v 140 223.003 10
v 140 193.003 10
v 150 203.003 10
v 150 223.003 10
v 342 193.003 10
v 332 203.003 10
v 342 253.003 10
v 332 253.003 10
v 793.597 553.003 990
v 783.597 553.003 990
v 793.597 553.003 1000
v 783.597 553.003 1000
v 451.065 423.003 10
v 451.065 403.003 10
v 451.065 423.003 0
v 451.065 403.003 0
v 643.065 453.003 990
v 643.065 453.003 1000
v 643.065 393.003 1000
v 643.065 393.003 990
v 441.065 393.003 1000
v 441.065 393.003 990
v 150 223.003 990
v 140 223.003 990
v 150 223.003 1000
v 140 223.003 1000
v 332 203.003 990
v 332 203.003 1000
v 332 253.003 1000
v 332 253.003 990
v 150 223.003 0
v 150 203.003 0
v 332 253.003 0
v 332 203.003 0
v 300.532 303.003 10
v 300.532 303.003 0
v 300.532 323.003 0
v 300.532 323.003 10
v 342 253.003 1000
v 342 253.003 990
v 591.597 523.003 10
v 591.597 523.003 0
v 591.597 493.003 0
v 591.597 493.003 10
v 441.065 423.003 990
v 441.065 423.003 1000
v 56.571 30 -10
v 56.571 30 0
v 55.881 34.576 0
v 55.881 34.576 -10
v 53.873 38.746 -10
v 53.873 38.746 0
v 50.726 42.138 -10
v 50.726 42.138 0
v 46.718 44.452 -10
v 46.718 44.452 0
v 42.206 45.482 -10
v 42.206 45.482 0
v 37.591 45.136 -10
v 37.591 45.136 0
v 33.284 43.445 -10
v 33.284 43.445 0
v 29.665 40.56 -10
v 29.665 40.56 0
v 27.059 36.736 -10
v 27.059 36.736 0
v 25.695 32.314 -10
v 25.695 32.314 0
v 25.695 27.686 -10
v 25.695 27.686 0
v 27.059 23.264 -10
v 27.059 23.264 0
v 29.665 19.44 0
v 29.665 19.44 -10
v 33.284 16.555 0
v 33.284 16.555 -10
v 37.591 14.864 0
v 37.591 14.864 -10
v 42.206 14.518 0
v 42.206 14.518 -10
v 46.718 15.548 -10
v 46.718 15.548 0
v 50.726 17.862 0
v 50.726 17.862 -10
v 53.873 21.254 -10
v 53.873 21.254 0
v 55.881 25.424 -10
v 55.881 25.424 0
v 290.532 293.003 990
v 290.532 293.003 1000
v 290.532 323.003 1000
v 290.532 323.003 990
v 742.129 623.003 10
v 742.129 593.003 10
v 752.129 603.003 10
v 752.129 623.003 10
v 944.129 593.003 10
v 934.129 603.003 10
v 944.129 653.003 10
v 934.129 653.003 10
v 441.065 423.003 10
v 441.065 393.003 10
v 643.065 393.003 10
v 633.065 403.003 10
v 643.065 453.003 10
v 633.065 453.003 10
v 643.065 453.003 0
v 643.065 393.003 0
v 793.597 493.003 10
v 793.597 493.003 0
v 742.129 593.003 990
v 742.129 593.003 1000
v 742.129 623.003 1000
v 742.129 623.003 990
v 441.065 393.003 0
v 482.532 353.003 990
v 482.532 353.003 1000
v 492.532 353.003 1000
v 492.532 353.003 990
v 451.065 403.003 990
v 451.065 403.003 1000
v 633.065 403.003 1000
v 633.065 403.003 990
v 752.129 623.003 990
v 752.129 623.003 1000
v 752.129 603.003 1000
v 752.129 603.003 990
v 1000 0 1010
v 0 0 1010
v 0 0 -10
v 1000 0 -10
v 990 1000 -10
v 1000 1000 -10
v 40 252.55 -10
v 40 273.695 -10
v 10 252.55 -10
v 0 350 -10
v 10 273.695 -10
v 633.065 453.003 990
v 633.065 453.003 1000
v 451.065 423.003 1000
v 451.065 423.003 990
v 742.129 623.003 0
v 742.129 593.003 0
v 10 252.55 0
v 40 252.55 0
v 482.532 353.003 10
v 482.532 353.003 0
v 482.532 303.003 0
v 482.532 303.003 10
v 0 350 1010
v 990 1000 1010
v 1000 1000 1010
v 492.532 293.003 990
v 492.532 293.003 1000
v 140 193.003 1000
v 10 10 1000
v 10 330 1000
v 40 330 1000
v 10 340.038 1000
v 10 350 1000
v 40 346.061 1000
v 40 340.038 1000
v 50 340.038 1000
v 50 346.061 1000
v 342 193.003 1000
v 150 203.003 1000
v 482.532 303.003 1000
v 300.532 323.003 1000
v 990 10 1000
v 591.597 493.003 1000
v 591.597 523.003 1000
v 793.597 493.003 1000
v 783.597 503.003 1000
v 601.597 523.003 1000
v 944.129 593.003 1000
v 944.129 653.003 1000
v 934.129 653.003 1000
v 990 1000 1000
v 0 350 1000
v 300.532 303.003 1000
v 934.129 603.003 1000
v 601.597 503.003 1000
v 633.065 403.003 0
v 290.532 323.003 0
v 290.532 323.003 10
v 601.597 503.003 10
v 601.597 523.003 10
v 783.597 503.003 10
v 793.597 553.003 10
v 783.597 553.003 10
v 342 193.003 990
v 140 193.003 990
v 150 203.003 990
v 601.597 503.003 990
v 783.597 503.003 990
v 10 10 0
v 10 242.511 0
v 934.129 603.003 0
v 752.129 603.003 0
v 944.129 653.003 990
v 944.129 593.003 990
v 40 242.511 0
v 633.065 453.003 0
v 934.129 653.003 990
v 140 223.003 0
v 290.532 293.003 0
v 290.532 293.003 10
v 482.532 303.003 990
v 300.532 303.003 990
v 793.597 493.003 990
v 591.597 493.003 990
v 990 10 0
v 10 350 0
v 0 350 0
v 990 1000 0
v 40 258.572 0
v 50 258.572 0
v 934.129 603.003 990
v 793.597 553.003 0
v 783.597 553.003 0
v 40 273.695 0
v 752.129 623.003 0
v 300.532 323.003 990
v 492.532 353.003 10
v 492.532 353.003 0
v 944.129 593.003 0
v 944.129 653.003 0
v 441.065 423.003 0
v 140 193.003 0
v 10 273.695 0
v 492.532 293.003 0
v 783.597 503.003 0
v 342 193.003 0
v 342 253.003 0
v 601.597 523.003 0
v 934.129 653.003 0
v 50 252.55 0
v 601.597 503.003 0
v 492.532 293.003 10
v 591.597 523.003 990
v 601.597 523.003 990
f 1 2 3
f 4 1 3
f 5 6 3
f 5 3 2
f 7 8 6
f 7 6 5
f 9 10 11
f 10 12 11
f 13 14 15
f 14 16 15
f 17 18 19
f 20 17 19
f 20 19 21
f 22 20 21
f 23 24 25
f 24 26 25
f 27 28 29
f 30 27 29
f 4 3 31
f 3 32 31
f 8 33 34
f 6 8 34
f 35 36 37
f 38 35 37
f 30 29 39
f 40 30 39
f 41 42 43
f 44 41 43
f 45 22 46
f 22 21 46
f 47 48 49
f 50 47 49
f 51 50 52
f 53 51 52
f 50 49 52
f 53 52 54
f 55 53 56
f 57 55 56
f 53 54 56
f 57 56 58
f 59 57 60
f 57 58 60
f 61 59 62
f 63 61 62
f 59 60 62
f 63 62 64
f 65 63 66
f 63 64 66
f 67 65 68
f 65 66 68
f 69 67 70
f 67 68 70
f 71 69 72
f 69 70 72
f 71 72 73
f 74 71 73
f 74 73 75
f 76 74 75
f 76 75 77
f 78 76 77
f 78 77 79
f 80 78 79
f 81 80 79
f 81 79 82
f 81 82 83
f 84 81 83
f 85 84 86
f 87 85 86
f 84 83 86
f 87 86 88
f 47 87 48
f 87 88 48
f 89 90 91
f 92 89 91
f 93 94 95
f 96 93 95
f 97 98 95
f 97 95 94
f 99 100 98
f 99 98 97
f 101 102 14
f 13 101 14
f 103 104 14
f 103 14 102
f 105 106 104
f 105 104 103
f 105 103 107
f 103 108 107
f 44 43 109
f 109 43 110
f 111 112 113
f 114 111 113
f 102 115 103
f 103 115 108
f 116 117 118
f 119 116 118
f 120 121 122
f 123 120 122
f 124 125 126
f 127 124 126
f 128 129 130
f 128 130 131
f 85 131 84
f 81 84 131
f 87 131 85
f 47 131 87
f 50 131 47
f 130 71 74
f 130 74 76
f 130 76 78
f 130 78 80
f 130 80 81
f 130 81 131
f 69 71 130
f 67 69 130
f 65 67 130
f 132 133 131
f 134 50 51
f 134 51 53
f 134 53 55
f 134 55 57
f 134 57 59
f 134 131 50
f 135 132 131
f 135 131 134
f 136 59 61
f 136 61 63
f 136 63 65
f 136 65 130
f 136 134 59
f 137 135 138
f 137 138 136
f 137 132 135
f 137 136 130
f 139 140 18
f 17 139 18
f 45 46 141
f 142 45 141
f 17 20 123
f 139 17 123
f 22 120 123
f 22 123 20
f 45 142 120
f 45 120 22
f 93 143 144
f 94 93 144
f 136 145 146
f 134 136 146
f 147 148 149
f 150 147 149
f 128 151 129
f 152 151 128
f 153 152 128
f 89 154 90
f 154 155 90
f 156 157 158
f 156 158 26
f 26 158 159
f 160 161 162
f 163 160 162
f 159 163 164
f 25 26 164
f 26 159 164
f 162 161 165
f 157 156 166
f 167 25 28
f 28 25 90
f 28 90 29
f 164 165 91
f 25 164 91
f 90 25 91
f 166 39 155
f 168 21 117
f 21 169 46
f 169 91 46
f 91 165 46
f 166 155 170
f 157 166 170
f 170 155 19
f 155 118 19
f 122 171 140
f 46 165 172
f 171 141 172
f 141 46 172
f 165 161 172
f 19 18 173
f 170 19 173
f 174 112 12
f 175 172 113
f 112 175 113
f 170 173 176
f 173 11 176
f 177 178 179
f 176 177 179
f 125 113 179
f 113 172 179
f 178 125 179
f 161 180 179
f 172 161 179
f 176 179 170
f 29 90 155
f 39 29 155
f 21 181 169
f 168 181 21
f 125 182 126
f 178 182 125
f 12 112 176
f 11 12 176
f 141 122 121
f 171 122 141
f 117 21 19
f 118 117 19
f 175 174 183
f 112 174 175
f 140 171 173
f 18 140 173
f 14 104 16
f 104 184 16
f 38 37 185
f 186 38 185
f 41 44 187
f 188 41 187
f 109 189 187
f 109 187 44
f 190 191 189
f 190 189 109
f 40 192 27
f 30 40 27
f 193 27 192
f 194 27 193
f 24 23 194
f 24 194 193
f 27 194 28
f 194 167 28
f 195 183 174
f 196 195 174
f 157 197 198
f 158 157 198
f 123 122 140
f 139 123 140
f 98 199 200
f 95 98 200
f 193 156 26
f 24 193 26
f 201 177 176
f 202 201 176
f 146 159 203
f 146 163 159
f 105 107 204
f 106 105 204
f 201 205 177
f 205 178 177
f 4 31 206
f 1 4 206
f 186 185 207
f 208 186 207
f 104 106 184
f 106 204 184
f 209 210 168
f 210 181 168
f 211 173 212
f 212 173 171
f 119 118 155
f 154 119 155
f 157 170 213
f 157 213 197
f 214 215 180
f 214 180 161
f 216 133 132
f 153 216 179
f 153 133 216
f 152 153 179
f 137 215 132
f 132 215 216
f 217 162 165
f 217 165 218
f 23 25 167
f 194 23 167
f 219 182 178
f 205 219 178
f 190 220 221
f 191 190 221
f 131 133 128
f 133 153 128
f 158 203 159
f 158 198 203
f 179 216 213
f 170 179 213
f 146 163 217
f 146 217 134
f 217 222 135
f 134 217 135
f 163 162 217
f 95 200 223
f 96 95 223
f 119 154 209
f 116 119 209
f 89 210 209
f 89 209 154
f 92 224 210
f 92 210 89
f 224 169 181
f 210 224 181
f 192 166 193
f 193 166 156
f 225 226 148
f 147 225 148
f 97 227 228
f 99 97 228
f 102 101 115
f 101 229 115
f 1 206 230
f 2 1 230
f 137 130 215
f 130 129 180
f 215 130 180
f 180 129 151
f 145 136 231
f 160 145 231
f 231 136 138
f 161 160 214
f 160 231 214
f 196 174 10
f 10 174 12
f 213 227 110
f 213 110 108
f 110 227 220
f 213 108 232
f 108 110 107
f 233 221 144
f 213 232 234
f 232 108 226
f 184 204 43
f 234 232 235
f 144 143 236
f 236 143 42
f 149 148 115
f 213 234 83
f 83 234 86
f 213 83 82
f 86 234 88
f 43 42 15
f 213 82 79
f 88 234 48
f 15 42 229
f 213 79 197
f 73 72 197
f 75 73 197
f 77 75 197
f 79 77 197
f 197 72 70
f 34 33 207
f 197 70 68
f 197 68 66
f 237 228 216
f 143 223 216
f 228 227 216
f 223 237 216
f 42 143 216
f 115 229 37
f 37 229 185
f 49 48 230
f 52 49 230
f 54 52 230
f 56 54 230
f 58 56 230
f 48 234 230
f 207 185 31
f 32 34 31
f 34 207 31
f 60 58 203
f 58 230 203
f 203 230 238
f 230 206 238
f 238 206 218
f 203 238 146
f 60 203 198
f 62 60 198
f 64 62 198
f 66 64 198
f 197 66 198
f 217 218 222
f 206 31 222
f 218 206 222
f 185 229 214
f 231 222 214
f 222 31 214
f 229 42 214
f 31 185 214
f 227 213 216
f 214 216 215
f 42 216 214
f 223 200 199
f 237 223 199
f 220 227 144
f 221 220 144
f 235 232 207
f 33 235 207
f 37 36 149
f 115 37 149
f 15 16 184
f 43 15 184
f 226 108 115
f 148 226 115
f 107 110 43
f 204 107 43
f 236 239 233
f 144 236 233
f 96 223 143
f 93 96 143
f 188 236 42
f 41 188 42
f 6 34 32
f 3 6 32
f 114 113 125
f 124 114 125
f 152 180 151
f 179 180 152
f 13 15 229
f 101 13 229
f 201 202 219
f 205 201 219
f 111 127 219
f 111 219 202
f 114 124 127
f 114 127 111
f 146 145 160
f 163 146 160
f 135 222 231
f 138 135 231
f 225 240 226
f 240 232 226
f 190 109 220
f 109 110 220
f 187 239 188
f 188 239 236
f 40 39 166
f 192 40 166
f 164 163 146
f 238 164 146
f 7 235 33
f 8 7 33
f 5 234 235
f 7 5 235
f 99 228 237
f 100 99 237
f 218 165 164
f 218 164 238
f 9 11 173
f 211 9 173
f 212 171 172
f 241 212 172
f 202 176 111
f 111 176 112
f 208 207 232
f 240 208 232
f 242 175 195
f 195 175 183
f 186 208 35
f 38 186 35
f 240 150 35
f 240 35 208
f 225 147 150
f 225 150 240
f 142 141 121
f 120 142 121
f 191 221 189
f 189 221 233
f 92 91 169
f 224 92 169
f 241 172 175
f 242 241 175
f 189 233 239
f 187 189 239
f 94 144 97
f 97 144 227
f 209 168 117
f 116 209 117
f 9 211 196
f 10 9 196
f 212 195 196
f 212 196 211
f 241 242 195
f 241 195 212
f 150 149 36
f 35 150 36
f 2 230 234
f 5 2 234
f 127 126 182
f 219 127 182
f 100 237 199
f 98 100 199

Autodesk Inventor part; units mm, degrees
ref_plane "YZ Plane" through (0, 0, 0) normal (1, 0, 0) x (0, 1, 0)
ref_plane "XZ Plane" through (0, 0, 0) normal (0, 1, 0) x (-1, 0, 0)
sketch "Esboço1" plane through (0, 0, 0) normal (0, 0, 1) x (1, 0, 0)
  line L0 (0, 0) -> (1000, 0)
  line L1 (1000, 0) -> (1000, 1000)
  line L2 (0, 0) -> (0, 350)
  line L3 (990, 1000) -> (990, 10)
  line L4 (990, 10) -> (10, 10)
  line L5 (10, 10) -> (10, 350)
  line L6 (0, 350) -> (10, 350)
  line L7 (990, 1000) -> (1000, 1000)
  line L8 (0, 350) -> (10, 350)
  line L9 (990, 1000) -> (1000, 1000)
  dimension "d6" = 1000
  dimension "d7" = 1000
  dimension "d8" = 350
  dimension "d10" = 10
extrude "Extrusão1" add sketch "Esboço1" along normal blind 1000
sketch "Esboço2" plane through (0, 0, 1000) normal (0, 0, 1) x (1, 0, 0)
  line L0 (10, 10) -> (10, 350) projected
  line L1 (0, 350) -> (0, 0) projected
  line L2 (1000, 1000) -> (990, 1000) projected
  line L3 (0, 350) -> (990, 1000)
  line L4 (0, 0) -> (1000, 0) projected
  line L5 (1000, 0) -> (1000, 1000) projected
  line L6 (0, 350) -> (0, 0)
  line L7 (1000, 0) -> (1000, 1000)
  line L8 (990, 1000) -> (1000, 1000)
extrude "Extrusão2" add sketch "Esboço2" along normal blind 10
sketch "Esboço3" plane through (0, 0, 0) normal (0, 0, -1) x (-1, 0, 0)
  line L0 (-10, 350) -> (0, 350) projected
  line L1 (-1000, 1000) -> (-990, 1000) projected
  line L2 (0, 350) -> (-990, 1000)
  line L3 (-990, 1000) -> (-1000, 1000)
  line L4 (-1000, 1000) -> (-1000, 0)
  line L5 (0, 0) -> (-1000, 0) projected
  line L6 (-1000, 0) -> (0, 0)
  line L7 (0, 0) -> (0, 350)
extrude "Extrusão3" add sketch "Esboço3" along normal blind 10
sketch "Esboço4" plane through (10, 10, 1000) normal (1, 0, 0) x (0, 0, -1)
  line L0 (1000, 990) -> (1000, 0) projected
  line L1 (1000, 232.5113) -> (0, 320)
  line L2 (0, 0) -> (0, 340) projected
  line L3 (0, 340) -> (-10, 340) projected
  line L4 (1000, 242.5495) -> (0, 330.0382)
  line L5 (1000, 232.5113) -> (1000, 242.5495)
  line L6 (1000, 0) -> (1000, 340) projected
  line L7 (0, 330.0382) -> (0, 320)
  point P0 (1000, -10)
  dimension "d11" = 85
  dimension "d13" = 20
  dimension "d14" = 10
extrude "Extrusão4" add sketch "Esboço4" along normal blind 30
sketch "Esboço5" plane through (40, 10, 1000) normal (1, 0, 0) x (0, 0, -1)
  line L0 (1000, 232.5113) -> (0, 320) projected
  line L1 (1000, 232.5113) -> (0, 320)
  line L2 (0, 336.0611) -> (1000, 248.5725)
  line L3 (1000, 242.5495) -> (1000, 340) projected
  line L4 (1000, 248.5725) -> (1000, 242.5495)
  line L5 (0, 336.0611) -> (0, 320)
  line L6 (0, 330.0382) -> (0, 340) projected
  line L7 (1000, 0) -> (1000, 232.5113) projected
  line L8 (1000, 232.5113) -> (0, 320)
  line L9 (0, 330.0382) -> (1000, 242.5495) projected
  point P0 (1000, -10)
  dimension "d18" = 6
extrude "Extrusão5" add sketch "Esboço5" along normal blind 10
sketch "Esboço6" plane through (0, 0, 0) normal (0, 0, 1) x (1, 0, 0)
  line L0 (10, 252.5495) -> (10, 350) projected
  line L1 (10, 252.5495) -> (40, 252.5495)
  line L2 (40, 252.5495) -> (40, 273.6954)
  line L3 (40, 273.6954) -> (10, 273.6954)
  line L4 (10, 273.6954) -> (10, 252.5495)
  point P0 (0, 0)
extrude "Extrusão6" cut sketch "Esboço6" against normal blind 10
sketch "Esboço7" plane through (0, 0, 0) normal (0, 0, 1) x (1, 0, 0)
  line L0 (0, 350) -> (990, 1000) projected
  line L1 (591.5971, 523.0033) -> (591.5971, 493.0033)
  line L2 (591.5971, 493.0033) -> (793.5971, 493.0033)
  line L3 (793.5971, 493.0033) -> (793.5971, 553.0033)
  line L4 (793.5971, 553.0033) -> (783.5971, 553.0033)
  line L5 (783.5971, 553.0033) -> (783.5971, 503.0033)
  line L6 (783.5971, 503.0033) -> (601.5971, 503.0033)
  line L7 (601.5971, 503.0033) -> (601.5971, 523.0033)
  line L8 (601.5971, 523.0033) -> (591.5971, 523.0033)
  line L9 (0, 0) -> (0, 350) projected
  line L10 (441.0647, 423.0033) -> (441.0647, 393.0033)
  line L11 (441.0647, 393.0033) -> (643.0647, 393.0033)
  line L12 (643.0647, 393.0033) -> (643.0647, 453.0033)
  line L13 (643.0647, 453.0033) -> (633.0647, 453.0033)
  line L14 (633.0647, 453.0033) -> (633.0647, 403.0033)
  line L15 (633.0647, 403.0033) -> (451.0647, 403.0033)
  line L16 (451.0647, 403.0033) -> (451.0647, 423.0033)
  line L17 (451.0647, 423.0033) -> (441.0647, 423.0033)
  line L18 (290.5324, 323.0033) -> (290.5324, 293.0033)
  line L19 (290.5324, 293.0033) -> (492.5324, 293.0033)
  line L20 (492.5324, 293.0033) -> (492.5324, 353.0033)
  line L21 (492.5324, 353.0033) -> (482.5324, 353.0033)
  line L22 (482.5324, 353.0033) -> (482.5324, 303.0033)
  line L23 (482.5324, 303.0033) -> (300.5324, 303.0033)
  line L24 (300.5324, 303.0033) -> (300.5324, 323.0033)
  line L25 (300.5324, 323.0033) -> (290.5324, 323.0033)
  line L26 (140, 223.0033) -> (140, 193.0033)
  line L27 (140, 193.0033) -> (342, 193.0033)
  line L28 (342, 193.0033) -> (342, 253.0033)
  line L29 (342, 253.0033) -> (332, 253.0033)
  line L30 (332, 253.0033) -> (332, 203.0033)
  line L31 (332, 203.0033) -> (150, 203.0033)
  line L32 (150, 203.0033) -> (150, 223.0033)
  line L33 (150, 223.0033) -> (140, 223.0033)
  line L34 (0, 100) -> (1000, 764.309)
  line L35 (1000, 1000) -> (1000, 0) projected
  line L36 (742.1294, 623.0033) -> (742.1294, 593.0033)
  line L37 (742.1294, 593.0033) -> (944.1294, 593.0033)
  line L38 (944.1294, 593.0033) -> (944.1294, 653.0033)
  line L39 (944.1294, 653.0033) -> (934.1294, 653.0033)
  line L40 (934.1294, 653.0033) -> (934.1294, 603.0033)
  line L41 (934.1294, 603.0033) -> (752.1294, 603.0033)
  line L42 (752.1294, 603.0033) -> (752.1294, 623.0033)
  line L43 (752.1294, 623.0033) -> (742.1294, 623.0033)
  dimension "d23" = 202
  dimension "d24" = 10
  dimension "d25" = 10
  dimension "d26" = 10
  dimension "d27" = 30
  dimension "d28" = 60
  dimension "d35" = 202
  dimension "d36" = 10
  dimension "d37" = 10
  dimension "d38" = 10
  dimension "d39" = 30
  dimension "d40" = 60
  dimension "d41" = 202
  dimension "d42" = 10
  dimension "d43" = 10
  dimension "d44" = 10
  dimension "d45" = 30
  dimension "d46" = 60
  dimension "d47" = 202
  dimension "d48" = 10
  dimension "d49" = 10
  dimension "d50" = 10
  dimension "d51" = 30
  dimension "d52" = 60
  dimension "d53" = 100
  dimension "d54" = 202
  dimension "d55" = 10
  dimension "d56" = 10
  dimension "d57" = 10
  dimension "d58" = 30
  dimension "d59" = 60
  dimension "d60" = 90
  dimension "d61" = 90
  dimension "d62" = 90
  dimension "d63" = 90
  dimension "d64" = 764.309
  dimension "d65" = 140
extrude "Extrusão7" add sketch "Esboço7" along normal blind 10
ref_plane "Plano de trabalho1" through (0, 0, 500) normal (0, 0, 1) x (1, 0, 0)
mirror "Espelhamento1" about plane through (0, 0, 500) normal (0, 0, 1) of "Extrusão7"
sketch "Esboço8" plane through (0, 0, 0) normal (0, 0, 1) x (1, 0, 0)
  circle A0 centre (41.0461, 30) radius 15.525
  line L0 (990, 10) -> (10, 10) projected
  point P0 (0, 0)
  dimension "d68" = 31.05
  dimension "d69" = 20
extrude "Extrusão8" cut sketch "Esboço8" against normal blind 10
properties part number "caixa" material "Polipropileno"
